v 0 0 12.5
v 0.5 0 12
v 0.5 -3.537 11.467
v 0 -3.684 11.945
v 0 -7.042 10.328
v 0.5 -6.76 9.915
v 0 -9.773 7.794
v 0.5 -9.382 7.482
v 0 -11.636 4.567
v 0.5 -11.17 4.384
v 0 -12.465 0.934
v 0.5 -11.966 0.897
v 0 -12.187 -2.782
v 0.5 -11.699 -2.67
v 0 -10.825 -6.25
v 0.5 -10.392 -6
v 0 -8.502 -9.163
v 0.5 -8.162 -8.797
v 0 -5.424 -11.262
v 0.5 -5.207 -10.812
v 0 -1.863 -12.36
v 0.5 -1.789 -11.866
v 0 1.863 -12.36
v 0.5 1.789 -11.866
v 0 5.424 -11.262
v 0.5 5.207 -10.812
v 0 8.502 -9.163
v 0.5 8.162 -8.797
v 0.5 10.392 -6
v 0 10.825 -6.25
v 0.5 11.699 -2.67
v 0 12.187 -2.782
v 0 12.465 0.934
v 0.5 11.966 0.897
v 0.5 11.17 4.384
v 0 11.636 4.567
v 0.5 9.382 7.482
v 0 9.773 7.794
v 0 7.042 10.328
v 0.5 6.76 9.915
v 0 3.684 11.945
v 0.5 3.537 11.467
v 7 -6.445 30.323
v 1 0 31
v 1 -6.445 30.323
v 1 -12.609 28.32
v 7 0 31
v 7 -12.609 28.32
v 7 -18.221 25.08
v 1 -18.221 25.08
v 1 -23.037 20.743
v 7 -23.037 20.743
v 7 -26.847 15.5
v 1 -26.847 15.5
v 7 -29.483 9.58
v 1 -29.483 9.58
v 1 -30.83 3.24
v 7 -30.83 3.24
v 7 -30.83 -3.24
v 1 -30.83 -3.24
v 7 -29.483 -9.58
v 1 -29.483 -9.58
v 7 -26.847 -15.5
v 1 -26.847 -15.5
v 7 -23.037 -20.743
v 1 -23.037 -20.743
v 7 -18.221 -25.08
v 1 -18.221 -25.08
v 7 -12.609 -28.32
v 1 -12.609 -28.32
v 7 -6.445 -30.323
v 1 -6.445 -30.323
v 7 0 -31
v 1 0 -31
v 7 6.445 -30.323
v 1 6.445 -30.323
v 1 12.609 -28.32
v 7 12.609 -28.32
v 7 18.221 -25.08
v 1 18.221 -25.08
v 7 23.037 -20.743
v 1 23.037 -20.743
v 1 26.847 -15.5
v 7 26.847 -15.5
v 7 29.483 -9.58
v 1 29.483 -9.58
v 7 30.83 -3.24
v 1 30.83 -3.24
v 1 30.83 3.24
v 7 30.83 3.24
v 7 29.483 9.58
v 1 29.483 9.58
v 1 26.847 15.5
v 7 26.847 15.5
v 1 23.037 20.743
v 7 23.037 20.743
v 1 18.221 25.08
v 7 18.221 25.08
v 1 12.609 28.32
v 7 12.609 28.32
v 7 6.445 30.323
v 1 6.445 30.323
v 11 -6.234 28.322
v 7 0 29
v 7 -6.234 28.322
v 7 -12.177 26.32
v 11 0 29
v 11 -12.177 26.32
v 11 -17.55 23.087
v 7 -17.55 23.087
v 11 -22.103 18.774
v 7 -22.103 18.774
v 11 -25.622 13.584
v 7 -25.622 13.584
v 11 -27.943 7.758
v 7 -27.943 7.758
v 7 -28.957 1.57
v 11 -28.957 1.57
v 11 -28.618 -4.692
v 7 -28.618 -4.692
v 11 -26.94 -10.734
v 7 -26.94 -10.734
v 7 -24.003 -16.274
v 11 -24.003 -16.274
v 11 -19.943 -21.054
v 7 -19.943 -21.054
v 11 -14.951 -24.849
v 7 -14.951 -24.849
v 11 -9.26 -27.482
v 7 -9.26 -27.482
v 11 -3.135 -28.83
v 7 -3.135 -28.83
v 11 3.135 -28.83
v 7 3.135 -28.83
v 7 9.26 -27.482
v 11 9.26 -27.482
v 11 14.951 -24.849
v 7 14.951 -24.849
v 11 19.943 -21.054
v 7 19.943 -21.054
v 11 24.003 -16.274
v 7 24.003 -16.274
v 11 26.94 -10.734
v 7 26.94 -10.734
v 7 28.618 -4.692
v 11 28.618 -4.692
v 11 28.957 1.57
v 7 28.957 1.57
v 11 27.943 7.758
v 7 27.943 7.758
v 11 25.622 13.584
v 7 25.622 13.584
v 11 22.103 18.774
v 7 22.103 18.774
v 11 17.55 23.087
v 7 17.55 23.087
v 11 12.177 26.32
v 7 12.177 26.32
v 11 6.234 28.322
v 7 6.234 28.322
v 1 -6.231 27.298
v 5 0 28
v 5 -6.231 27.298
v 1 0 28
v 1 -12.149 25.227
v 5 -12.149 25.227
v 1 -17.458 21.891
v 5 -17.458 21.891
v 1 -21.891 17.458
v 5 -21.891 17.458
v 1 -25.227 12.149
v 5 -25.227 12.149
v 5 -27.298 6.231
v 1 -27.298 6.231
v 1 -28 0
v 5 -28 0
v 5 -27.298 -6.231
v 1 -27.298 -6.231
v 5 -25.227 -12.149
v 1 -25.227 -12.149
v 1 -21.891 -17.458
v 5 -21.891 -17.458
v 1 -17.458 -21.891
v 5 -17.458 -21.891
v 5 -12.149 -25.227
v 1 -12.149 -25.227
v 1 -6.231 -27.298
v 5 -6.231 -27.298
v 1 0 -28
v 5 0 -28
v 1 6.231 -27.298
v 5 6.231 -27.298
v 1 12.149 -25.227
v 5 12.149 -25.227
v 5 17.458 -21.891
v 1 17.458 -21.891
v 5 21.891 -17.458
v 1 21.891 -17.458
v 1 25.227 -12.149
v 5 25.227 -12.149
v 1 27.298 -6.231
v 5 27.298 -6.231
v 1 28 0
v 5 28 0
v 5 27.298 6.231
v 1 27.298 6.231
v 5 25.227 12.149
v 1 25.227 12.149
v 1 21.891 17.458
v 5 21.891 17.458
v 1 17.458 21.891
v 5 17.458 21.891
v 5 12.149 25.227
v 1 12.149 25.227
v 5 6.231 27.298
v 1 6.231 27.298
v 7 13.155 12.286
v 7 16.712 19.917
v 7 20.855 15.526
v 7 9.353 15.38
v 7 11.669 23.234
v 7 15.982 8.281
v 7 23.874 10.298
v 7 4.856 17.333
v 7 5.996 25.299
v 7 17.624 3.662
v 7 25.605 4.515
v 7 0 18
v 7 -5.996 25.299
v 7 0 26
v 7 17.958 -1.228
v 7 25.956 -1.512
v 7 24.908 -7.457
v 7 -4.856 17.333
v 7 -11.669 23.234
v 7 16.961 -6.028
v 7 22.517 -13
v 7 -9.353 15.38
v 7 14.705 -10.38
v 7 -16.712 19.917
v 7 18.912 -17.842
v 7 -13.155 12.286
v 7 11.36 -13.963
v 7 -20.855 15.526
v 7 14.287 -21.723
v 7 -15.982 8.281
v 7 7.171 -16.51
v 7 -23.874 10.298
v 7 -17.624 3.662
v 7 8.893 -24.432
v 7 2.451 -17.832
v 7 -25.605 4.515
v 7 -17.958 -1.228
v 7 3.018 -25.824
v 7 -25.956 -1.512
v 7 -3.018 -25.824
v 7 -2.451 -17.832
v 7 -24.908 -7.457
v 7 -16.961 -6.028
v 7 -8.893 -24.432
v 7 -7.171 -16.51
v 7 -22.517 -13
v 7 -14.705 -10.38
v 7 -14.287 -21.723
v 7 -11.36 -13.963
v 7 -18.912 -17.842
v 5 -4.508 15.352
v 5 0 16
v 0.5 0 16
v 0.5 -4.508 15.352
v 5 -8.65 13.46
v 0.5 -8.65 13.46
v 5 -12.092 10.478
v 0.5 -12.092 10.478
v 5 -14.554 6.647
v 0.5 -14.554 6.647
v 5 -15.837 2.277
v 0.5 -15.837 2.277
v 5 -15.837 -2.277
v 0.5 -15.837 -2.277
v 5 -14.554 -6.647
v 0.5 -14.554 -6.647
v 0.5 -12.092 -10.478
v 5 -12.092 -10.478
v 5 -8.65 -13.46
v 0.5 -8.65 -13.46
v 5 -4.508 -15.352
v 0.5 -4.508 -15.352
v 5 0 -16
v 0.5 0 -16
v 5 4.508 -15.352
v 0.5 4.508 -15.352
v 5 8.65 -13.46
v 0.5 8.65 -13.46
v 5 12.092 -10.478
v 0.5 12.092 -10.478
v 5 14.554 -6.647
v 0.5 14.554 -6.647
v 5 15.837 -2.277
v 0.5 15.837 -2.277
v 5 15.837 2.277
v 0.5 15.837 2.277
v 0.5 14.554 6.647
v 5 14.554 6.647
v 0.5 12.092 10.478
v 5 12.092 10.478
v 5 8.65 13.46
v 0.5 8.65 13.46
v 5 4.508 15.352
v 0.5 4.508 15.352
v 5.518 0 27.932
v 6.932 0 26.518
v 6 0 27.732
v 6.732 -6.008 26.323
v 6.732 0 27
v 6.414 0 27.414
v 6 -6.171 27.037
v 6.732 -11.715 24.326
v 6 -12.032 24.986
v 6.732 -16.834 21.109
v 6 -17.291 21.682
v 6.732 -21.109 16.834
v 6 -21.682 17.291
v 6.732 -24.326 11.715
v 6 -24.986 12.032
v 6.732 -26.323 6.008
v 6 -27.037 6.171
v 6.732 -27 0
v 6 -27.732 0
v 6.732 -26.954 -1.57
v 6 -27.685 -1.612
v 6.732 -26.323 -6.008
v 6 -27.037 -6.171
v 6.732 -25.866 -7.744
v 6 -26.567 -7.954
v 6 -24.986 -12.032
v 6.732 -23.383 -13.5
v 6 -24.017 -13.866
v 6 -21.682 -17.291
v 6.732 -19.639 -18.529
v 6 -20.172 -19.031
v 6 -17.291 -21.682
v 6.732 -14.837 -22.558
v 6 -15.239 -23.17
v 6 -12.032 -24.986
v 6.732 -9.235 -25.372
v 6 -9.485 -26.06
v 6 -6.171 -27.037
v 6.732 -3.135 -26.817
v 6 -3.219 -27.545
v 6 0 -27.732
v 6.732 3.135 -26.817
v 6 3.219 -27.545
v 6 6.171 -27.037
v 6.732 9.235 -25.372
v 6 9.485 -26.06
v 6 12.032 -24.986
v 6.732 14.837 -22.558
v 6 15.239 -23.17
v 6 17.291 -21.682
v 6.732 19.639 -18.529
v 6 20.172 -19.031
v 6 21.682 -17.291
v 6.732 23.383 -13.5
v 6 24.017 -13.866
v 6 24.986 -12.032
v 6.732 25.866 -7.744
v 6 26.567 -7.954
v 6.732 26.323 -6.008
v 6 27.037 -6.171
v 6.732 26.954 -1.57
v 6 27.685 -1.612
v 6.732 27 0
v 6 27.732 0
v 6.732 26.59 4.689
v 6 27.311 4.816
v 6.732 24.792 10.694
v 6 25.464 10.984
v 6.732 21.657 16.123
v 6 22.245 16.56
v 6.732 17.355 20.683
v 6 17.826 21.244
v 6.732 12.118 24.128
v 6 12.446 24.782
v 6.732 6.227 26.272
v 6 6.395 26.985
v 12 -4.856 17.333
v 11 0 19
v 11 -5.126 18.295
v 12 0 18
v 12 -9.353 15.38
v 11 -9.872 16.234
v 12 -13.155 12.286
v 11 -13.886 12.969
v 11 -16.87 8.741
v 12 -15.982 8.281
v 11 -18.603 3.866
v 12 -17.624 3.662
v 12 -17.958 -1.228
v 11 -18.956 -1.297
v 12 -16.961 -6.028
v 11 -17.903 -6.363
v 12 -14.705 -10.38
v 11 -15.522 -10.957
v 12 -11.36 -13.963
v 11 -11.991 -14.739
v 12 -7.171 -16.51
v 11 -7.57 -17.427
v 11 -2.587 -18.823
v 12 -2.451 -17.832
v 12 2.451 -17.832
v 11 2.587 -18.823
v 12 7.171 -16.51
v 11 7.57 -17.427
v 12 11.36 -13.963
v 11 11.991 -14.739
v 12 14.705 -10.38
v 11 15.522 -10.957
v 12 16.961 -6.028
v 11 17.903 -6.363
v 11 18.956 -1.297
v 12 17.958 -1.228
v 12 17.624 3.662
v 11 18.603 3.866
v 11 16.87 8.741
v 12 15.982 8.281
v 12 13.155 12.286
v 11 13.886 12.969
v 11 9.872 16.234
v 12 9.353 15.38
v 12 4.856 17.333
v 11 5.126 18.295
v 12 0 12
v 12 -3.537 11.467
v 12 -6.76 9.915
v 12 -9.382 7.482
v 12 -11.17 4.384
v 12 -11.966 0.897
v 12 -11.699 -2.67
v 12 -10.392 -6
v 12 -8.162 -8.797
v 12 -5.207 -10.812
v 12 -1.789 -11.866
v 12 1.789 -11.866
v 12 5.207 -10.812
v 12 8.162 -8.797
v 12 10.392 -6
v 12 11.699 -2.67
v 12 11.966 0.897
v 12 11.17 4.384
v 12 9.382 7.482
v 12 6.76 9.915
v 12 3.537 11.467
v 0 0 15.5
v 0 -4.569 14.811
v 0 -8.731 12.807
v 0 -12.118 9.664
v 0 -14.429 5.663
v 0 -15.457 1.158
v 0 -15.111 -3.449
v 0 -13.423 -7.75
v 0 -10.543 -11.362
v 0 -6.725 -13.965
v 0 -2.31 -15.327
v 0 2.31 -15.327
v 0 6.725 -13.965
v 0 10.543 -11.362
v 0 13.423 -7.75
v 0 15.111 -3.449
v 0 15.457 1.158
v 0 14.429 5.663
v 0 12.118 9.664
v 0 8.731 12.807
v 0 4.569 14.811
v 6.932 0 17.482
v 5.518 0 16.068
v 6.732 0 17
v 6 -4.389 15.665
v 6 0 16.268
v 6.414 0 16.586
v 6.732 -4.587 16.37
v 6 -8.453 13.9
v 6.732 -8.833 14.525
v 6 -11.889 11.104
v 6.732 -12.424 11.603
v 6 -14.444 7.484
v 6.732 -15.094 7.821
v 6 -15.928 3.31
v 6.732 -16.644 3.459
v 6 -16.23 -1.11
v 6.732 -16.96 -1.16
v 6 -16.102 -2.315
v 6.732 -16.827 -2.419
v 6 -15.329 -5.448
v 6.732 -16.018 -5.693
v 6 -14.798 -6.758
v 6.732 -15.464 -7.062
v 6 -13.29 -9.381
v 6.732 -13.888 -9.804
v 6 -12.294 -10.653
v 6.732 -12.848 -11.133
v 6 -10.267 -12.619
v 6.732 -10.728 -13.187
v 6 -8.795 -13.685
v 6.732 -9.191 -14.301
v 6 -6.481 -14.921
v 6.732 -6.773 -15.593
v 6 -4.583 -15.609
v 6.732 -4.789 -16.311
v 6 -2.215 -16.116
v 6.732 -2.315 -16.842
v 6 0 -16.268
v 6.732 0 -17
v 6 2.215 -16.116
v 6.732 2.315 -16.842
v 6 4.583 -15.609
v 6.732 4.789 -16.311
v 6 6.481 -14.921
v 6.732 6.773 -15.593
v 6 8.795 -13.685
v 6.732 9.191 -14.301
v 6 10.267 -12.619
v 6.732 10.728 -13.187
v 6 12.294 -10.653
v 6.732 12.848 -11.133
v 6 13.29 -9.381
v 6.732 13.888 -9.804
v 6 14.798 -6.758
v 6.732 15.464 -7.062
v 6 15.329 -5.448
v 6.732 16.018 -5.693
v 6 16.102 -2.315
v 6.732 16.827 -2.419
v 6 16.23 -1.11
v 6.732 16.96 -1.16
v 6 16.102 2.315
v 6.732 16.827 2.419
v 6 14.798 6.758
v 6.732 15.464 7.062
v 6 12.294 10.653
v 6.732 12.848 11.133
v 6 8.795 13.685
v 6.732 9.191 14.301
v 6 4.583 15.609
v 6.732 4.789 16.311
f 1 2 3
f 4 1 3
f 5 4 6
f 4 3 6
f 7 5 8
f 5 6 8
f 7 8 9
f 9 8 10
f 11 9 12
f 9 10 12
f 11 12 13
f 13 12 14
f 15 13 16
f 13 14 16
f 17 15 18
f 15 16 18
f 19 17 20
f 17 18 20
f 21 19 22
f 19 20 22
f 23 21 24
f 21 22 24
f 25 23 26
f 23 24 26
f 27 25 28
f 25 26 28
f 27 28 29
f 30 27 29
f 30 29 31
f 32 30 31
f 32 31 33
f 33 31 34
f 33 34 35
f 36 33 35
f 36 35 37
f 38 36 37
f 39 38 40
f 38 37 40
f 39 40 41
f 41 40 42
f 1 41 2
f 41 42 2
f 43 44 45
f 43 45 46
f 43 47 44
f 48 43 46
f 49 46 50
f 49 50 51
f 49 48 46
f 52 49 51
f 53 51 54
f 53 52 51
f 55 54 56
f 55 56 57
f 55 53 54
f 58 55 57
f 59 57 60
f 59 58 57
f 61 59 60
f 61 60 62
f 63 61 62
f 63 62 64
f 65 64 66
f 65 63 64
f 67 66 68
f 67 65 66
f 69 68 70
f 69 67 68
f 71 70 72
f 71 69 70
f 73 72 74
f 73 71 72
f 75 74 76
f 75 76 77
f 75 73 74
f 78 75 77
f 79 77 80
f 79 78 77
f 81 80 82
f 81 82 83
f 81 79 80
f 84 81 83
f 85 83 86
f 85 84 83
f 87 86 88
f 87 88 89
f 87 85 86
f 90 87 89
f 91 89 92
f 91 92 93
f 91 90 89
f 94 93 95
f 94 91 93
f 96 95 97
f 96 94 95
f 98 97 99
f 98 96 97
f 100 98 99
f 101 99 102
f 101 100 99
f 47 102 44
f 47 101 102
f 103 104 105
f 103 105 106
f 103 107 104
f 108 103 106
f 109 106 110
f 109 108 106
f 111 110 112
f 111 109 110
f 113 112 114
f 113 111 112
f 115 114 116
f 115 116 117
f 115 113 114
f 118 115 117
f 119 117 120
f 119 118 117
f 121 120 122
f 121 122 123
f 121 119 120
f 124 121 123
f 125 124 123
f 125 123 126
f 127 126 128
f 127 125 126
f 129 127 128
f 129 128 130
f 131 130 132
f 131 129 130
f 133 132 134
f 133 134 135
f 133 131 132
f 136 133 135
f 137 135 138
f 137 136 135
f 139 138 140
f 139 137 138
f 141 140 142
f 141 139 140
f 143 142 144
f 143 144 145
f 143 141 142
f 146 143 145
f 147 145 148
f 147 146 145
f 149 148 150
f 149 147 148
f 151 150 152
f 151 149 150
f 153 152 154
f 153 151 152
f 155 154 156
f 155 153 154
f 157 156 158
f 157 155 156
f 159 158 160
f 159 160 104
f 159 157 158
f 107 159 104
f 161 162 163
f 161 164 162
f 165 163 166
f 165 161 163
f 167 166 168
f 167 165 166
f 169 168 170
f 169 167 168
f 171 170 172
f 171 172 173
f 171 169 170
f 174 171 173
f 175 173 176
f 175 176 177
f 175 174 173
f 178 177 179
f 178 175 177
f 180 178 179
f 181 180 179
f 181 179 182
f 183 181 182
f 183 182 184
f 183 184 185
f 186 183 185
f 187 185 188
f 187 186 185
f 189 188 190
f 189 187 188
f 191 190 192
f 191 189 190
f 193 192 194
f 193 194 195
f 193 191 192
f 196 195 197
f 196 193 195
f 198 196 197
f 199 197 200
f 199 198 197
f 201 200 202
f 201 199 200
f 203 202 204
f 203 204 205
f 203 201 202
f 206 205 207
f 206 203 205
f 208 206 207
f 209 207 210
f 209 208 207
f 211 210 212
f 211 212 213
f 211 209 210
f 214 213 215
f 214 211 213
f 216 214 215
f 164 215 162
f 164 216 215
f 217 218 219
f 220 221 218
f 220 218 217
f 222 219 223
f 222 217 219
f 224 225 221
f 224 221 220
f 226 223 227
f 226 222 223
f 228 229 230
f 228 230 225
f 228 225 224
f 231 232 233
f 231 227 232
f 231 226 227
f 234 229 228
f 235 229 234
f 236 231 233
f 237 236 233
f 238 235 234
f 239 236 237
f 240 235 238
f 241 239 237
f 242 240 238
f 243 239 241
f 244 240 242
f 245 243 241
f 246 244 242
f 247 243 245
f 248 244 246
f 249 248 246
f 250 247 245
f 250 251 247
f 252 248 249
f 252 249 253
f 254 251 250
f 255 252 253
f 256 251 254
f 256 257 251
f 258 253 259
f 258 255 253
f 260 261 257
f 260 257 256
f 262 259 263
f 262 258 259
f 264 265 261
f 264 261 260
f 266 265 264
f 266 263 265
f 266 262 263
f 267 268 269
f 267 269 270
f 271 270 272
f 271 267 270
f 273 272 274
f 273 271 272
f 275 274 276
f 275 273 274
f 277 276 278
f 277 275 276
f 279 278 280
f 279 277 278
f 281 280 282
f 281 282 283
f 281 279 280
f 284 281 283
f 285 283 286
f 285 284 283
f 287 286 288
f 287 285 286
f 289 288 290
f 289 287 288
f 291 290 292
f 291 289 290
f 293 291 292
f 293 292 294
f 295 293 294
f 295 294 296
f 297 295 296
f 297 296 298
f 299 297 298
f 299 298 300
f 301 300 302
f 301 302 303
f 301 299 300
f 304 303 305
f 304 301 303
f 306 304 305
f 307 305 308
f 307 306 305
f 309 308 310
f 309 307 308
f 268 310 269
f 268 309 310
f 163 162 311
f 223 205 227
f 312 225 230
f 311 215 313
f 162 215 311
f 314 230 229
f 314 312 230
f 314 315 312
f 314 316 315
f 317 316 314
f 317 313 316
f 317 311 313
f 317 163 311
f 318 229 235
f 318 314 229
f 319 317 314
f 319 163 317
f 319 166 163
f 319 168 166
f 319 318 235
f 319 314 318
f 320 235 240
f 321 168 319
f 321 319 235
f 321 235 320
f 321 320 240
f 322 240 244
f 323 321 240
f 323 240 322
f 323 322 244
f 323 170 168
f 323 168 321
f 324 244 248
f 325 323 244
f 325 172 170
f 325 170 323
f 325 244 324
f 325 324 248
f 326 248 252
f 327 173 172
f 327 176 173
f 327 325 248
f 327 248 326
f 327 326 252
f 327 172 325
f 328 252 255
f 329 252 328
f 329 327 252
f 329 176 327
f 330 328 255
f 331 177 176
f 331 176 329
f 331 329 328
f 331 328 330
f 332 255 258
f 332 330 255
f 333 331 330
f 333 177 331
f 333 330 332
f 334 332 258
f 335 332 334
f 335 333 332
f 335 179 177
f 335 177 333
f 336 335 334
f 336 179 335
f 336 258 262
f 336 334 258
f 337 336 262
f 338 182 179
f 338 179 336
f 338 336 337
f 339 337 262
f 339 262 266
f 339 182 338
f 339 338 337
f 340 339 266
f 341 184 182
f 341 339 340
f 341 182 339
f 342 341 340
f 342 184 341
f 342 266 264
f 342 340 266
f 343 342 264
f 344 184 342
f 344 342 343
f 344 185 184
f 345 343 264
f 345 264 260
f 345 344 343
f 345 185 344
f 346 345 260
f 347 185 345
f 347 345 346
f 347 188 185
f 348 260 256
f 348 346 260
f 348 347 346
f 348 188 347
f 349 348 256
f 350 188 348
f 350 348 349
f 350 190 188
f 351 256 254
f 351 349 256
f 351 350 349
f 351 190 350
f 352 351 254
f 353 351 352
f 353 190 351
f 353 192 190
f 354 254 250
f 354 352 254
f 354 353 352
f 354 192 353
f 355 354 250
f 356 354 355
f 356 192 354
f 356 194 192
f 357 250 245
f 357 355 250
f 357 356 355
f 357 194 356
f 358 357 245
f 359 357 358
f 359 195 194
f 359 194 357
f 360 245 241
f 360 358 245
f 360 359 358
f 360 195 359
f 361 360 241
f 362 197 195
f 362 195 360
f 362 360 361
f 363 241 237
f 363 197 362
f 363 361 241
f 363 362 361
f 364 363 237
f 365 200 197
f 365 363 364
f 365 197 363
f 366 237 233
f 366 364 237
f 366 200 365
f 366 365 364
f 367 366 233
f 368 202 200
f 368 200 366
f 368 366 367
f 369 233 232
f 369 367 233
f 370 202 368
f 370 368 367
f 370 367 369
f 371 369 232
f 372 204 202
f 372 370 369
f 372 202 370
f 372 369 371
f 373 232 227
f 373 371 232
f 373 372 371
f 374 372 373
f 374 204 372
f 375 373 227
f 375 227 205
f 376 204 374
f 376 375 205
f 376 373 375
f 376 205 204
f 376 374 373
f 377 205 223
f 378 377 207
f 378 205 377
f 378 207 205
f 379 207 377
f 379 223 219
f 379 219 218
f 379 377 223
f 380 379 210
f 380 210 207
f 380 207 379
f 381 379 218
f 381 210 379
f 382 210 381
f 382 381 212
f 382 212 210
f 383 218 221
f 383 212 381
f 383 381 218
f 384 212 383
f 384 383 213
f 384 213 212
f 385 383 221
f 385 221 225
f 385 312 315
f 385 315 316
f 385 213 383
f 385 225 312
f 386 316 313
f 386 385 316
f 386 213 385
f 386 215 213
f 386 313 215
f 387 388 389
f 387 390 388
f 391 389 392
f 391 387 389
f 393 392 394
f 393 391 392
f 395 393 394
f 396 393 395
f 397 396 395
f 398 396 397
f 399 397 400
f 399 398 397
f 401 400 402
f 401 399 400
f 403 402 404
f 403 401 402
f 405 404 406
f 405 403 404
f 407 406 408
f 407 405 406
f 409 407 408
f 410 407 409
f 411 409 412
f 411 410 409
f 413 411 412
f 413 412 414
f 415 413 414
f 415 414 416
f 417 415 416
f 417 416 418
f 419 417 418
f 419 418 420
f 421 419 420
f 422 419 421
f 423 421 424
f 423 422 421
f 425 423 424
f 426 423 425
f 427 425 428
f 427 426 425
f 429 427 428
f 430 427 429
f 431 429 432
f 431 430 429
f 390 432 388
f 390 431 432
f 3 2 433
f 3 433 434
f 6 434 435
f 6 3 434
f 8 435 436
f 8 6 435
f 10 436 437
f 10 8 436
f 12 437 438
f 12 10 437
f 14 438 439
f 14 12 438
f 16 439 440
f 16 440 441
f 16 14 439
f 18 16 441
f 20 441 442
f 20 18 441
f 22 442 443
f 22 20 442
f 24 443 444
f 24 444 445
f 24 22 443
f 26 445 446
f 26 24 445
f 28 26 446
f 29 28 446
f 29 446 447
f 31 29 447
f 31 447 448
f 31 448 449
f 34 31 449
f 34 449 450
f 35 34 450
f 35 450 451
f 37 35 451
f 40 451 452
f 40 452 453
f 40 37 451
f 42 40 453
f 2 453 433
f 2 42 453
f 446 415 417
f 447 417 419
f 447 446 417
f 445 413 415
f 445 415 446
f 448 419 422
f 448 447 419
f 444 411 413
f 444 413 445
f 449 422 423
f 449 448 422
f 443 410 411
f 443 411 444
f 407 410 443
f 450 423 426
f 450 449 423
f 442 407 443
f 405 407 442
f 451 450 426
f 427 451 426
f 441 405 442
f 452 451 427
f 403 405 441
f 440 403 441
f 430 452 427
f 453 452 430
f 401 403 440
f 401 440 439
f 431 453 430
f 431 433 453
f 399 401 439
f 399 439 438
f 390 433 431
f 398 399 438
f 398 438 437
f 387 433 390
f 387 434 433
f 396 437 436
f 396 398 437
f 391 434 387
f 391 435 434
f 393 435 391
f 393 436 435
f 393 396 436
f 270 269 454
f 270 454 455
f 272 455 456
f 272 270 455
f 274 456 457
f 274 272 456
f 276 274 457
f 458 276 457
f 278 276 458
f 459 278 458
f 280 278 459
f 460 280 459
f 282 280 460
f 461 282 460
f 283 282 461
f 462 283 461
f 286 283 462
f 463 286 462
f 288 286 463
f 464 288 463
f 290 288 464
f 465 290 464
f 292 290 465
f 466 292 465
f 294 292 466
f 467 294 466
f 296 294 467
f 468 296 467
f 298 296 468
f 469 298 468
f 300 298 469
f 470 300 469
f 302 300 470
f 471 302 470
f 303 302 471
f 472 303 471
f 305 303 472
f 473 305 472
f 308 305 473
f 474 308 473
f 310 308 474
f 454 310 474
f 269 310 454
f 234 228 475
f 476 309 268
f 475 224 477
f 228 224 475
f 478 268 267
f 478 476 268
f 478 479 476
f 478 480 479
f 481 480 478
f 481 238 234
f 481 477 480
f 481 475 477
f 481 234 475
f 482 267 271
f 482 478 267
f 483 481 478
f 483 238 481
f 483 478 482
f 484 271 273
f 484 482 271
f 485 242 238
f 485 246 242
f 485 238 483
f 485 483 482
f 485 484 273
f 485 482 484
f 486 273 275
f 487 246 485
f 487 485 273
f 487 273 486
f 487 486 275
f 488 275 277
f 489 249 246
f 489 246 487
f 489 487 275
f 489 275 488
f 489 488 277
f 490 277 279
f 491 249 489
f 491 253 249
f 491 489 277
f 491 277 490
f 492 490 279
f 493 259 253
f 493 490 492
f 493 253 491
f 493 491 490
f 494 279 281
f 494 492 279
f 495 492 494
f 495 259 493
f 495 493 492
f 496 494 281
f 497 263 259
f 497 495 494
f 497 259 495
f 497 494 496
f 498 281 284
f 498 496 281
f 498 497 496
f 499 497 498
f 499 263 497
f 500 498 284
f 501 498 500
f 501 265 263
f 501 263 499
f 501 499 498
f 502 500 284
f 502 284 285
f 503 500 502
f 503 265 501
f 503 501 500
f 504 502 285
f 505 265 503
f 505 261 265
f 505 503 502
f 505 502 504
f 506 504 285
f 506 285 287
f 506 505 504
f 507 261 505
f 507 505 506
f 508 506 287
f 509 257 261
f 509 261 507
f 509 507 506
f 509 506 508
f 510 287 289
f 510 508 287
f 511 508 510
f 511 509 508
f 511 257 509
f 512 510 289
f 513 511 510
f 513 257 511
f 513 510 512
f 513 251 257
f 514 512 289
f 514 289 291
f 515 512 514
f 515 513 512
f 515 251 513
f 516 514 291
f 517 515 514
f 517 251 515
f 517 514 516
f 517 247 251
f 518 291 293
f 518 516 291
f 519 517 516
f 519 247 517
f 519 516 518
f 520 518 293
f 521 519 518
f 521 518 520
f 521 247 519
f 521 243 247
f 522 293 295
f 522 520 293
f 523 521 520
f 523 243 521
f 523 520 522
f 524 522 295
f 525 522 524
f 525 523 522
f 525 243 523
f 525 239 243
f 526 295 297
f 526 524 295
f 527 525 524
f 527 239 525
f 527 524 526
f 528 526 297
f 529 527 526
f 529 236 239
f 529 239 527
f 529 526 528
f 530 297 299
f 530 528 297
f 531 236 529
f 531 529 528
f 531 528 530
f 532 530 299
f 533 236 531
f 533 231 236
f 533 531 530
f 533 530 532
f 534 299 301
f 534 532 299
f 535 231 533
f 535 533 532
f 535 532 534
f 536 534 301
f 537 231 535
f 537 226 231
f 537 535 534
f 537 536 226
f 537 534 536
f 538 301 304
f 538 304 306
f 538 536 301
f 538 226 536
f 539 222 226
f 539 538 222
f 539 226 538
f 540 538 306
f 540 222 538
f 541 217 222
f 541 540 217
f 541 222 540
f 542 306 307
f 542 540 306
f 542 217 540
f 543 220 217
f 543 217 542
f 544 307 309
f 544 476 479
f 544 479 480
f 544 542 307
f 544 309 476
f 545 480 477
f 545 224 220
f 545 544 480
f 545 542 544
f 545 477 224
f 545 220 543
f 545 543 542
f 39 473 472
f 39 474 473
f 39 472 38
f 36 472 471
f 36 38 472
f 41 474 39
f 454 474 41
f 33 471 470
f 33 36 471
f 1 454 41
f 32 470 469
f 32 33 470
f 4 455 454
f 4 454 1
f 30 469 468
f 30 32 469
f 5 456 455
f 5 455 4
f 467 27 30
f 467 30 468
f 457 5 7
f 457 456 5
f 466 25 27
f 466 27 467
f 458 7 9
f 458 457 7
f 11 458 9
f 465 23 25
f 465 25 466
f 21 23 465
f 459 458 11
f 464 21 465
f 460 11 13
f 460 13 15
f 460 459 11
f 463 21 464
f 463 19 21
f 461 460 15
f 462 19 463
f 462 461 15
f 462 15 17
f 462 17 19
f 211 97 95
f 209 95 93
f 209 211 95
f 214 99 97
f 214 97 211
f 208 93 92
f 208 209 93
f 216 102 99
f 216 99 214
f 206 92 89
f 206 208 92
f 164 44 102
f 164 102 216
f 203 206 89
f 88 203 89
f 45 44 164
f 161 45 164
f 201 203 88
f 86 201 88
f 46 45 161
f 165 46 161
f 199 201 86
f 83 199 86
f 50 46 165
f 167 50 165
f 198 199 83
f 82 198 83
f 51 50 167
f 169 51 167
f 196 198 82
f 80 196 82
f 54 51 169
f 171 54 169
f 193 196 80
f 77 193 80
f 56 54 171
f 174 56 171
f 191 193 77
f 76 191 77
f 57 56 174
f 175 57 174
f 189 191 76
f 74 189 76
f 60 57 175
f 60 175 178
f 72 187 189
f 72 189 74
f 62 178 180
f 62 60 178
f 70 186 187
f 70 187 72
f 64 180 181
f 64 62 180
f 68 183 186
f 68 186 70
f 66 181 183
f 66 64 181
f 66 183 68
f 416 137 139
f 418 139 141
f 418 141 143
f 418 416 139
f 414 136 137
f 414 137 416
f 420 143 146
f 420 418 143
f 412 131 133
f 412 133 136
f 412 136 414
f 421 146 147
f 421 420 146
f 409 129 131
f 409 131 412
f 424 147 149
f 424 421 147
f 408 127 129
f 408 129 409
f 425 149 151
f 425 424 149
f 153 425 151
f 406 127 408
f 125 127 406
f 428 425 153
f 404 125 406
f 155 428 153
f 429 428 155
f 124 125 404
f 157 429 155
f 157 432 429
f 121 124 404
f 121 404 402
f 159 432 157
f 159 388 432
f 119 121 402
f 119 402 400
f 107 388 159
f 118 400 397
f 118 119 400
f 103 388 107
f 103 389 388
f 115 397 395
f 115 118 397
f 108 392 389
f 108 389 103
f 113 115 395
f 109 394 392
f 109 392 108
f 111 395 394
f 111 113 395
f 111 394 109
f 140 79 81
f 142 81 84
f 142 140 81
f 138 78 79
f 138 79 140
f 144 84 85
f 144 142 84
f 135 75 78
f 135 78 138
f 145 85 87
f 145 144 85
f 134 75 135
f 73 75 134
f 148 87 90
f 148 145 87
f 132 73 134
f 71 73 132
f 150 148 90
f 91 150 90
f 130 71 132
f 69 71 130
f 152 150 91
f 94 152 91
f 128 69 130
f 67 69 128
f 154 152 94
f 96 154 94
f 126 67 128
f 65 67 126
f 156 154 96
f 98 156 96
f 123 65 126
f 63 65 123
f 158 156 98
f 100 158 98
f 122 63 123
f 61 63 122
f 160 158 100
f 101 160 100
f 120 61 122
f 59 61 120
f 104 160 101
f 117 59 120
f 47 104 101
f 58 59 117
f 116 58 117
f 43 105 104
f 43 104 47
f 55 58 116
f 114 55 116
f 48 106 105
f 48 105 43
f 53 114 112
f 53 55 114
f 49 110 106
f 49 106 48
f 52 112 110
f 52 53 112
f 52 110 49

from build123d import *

# Parameters (mm, degrees)
CHANFREIN1_SIZE = 0.5


with BuildPart() as part:
    # Esquisse1 → Base-Révolution (revolve)
    with BuildSketch(Plane.XY, mode=Mode.PRIVATE) as base_r_volution_sk:
        with BuildLine():
            Line((0, 12), (0, 16))
            Line((0, 16), (5, 16))
            ThreePointArc((5, 16), (6.414213562, 16.585786438), (7, 18))
            Line((7, 18), (7, 26))
            ThreePointArc((7, 26), (6.414213562, 27.414213562), (5, 28))
            Line((5, 28), (1, 28))
            Line((1, 28), (1, 31))
            Line((1, 31), (7, 31))
            Line((7, 31), (7, 29))
            Line((7, 29), (11, 29))
            Line((11, 29), (11, 19))
            Line((11, 19), (12, 18))
            Line((12, 18), (12, 12))
            Line((12, 12), (0, 12))
        make_face()
    revolve(base_r_volution_sk.sketch.rotate(Axis((-8, 0, 0), (1, 0, 0)), 90), axis=Axis((-8, 0, 0), (1, 0, 0)))

    # Chanfrein1
    chanfrein1_edges = [part.edges().sort_by_distance(p)[0] for p in [
        (0, 0, -12),
        (0, 0, -16),
    ]]
    chamfer(chanfrein1_edges, length=CHANFREIN1_SIZE)


solid = part.part
